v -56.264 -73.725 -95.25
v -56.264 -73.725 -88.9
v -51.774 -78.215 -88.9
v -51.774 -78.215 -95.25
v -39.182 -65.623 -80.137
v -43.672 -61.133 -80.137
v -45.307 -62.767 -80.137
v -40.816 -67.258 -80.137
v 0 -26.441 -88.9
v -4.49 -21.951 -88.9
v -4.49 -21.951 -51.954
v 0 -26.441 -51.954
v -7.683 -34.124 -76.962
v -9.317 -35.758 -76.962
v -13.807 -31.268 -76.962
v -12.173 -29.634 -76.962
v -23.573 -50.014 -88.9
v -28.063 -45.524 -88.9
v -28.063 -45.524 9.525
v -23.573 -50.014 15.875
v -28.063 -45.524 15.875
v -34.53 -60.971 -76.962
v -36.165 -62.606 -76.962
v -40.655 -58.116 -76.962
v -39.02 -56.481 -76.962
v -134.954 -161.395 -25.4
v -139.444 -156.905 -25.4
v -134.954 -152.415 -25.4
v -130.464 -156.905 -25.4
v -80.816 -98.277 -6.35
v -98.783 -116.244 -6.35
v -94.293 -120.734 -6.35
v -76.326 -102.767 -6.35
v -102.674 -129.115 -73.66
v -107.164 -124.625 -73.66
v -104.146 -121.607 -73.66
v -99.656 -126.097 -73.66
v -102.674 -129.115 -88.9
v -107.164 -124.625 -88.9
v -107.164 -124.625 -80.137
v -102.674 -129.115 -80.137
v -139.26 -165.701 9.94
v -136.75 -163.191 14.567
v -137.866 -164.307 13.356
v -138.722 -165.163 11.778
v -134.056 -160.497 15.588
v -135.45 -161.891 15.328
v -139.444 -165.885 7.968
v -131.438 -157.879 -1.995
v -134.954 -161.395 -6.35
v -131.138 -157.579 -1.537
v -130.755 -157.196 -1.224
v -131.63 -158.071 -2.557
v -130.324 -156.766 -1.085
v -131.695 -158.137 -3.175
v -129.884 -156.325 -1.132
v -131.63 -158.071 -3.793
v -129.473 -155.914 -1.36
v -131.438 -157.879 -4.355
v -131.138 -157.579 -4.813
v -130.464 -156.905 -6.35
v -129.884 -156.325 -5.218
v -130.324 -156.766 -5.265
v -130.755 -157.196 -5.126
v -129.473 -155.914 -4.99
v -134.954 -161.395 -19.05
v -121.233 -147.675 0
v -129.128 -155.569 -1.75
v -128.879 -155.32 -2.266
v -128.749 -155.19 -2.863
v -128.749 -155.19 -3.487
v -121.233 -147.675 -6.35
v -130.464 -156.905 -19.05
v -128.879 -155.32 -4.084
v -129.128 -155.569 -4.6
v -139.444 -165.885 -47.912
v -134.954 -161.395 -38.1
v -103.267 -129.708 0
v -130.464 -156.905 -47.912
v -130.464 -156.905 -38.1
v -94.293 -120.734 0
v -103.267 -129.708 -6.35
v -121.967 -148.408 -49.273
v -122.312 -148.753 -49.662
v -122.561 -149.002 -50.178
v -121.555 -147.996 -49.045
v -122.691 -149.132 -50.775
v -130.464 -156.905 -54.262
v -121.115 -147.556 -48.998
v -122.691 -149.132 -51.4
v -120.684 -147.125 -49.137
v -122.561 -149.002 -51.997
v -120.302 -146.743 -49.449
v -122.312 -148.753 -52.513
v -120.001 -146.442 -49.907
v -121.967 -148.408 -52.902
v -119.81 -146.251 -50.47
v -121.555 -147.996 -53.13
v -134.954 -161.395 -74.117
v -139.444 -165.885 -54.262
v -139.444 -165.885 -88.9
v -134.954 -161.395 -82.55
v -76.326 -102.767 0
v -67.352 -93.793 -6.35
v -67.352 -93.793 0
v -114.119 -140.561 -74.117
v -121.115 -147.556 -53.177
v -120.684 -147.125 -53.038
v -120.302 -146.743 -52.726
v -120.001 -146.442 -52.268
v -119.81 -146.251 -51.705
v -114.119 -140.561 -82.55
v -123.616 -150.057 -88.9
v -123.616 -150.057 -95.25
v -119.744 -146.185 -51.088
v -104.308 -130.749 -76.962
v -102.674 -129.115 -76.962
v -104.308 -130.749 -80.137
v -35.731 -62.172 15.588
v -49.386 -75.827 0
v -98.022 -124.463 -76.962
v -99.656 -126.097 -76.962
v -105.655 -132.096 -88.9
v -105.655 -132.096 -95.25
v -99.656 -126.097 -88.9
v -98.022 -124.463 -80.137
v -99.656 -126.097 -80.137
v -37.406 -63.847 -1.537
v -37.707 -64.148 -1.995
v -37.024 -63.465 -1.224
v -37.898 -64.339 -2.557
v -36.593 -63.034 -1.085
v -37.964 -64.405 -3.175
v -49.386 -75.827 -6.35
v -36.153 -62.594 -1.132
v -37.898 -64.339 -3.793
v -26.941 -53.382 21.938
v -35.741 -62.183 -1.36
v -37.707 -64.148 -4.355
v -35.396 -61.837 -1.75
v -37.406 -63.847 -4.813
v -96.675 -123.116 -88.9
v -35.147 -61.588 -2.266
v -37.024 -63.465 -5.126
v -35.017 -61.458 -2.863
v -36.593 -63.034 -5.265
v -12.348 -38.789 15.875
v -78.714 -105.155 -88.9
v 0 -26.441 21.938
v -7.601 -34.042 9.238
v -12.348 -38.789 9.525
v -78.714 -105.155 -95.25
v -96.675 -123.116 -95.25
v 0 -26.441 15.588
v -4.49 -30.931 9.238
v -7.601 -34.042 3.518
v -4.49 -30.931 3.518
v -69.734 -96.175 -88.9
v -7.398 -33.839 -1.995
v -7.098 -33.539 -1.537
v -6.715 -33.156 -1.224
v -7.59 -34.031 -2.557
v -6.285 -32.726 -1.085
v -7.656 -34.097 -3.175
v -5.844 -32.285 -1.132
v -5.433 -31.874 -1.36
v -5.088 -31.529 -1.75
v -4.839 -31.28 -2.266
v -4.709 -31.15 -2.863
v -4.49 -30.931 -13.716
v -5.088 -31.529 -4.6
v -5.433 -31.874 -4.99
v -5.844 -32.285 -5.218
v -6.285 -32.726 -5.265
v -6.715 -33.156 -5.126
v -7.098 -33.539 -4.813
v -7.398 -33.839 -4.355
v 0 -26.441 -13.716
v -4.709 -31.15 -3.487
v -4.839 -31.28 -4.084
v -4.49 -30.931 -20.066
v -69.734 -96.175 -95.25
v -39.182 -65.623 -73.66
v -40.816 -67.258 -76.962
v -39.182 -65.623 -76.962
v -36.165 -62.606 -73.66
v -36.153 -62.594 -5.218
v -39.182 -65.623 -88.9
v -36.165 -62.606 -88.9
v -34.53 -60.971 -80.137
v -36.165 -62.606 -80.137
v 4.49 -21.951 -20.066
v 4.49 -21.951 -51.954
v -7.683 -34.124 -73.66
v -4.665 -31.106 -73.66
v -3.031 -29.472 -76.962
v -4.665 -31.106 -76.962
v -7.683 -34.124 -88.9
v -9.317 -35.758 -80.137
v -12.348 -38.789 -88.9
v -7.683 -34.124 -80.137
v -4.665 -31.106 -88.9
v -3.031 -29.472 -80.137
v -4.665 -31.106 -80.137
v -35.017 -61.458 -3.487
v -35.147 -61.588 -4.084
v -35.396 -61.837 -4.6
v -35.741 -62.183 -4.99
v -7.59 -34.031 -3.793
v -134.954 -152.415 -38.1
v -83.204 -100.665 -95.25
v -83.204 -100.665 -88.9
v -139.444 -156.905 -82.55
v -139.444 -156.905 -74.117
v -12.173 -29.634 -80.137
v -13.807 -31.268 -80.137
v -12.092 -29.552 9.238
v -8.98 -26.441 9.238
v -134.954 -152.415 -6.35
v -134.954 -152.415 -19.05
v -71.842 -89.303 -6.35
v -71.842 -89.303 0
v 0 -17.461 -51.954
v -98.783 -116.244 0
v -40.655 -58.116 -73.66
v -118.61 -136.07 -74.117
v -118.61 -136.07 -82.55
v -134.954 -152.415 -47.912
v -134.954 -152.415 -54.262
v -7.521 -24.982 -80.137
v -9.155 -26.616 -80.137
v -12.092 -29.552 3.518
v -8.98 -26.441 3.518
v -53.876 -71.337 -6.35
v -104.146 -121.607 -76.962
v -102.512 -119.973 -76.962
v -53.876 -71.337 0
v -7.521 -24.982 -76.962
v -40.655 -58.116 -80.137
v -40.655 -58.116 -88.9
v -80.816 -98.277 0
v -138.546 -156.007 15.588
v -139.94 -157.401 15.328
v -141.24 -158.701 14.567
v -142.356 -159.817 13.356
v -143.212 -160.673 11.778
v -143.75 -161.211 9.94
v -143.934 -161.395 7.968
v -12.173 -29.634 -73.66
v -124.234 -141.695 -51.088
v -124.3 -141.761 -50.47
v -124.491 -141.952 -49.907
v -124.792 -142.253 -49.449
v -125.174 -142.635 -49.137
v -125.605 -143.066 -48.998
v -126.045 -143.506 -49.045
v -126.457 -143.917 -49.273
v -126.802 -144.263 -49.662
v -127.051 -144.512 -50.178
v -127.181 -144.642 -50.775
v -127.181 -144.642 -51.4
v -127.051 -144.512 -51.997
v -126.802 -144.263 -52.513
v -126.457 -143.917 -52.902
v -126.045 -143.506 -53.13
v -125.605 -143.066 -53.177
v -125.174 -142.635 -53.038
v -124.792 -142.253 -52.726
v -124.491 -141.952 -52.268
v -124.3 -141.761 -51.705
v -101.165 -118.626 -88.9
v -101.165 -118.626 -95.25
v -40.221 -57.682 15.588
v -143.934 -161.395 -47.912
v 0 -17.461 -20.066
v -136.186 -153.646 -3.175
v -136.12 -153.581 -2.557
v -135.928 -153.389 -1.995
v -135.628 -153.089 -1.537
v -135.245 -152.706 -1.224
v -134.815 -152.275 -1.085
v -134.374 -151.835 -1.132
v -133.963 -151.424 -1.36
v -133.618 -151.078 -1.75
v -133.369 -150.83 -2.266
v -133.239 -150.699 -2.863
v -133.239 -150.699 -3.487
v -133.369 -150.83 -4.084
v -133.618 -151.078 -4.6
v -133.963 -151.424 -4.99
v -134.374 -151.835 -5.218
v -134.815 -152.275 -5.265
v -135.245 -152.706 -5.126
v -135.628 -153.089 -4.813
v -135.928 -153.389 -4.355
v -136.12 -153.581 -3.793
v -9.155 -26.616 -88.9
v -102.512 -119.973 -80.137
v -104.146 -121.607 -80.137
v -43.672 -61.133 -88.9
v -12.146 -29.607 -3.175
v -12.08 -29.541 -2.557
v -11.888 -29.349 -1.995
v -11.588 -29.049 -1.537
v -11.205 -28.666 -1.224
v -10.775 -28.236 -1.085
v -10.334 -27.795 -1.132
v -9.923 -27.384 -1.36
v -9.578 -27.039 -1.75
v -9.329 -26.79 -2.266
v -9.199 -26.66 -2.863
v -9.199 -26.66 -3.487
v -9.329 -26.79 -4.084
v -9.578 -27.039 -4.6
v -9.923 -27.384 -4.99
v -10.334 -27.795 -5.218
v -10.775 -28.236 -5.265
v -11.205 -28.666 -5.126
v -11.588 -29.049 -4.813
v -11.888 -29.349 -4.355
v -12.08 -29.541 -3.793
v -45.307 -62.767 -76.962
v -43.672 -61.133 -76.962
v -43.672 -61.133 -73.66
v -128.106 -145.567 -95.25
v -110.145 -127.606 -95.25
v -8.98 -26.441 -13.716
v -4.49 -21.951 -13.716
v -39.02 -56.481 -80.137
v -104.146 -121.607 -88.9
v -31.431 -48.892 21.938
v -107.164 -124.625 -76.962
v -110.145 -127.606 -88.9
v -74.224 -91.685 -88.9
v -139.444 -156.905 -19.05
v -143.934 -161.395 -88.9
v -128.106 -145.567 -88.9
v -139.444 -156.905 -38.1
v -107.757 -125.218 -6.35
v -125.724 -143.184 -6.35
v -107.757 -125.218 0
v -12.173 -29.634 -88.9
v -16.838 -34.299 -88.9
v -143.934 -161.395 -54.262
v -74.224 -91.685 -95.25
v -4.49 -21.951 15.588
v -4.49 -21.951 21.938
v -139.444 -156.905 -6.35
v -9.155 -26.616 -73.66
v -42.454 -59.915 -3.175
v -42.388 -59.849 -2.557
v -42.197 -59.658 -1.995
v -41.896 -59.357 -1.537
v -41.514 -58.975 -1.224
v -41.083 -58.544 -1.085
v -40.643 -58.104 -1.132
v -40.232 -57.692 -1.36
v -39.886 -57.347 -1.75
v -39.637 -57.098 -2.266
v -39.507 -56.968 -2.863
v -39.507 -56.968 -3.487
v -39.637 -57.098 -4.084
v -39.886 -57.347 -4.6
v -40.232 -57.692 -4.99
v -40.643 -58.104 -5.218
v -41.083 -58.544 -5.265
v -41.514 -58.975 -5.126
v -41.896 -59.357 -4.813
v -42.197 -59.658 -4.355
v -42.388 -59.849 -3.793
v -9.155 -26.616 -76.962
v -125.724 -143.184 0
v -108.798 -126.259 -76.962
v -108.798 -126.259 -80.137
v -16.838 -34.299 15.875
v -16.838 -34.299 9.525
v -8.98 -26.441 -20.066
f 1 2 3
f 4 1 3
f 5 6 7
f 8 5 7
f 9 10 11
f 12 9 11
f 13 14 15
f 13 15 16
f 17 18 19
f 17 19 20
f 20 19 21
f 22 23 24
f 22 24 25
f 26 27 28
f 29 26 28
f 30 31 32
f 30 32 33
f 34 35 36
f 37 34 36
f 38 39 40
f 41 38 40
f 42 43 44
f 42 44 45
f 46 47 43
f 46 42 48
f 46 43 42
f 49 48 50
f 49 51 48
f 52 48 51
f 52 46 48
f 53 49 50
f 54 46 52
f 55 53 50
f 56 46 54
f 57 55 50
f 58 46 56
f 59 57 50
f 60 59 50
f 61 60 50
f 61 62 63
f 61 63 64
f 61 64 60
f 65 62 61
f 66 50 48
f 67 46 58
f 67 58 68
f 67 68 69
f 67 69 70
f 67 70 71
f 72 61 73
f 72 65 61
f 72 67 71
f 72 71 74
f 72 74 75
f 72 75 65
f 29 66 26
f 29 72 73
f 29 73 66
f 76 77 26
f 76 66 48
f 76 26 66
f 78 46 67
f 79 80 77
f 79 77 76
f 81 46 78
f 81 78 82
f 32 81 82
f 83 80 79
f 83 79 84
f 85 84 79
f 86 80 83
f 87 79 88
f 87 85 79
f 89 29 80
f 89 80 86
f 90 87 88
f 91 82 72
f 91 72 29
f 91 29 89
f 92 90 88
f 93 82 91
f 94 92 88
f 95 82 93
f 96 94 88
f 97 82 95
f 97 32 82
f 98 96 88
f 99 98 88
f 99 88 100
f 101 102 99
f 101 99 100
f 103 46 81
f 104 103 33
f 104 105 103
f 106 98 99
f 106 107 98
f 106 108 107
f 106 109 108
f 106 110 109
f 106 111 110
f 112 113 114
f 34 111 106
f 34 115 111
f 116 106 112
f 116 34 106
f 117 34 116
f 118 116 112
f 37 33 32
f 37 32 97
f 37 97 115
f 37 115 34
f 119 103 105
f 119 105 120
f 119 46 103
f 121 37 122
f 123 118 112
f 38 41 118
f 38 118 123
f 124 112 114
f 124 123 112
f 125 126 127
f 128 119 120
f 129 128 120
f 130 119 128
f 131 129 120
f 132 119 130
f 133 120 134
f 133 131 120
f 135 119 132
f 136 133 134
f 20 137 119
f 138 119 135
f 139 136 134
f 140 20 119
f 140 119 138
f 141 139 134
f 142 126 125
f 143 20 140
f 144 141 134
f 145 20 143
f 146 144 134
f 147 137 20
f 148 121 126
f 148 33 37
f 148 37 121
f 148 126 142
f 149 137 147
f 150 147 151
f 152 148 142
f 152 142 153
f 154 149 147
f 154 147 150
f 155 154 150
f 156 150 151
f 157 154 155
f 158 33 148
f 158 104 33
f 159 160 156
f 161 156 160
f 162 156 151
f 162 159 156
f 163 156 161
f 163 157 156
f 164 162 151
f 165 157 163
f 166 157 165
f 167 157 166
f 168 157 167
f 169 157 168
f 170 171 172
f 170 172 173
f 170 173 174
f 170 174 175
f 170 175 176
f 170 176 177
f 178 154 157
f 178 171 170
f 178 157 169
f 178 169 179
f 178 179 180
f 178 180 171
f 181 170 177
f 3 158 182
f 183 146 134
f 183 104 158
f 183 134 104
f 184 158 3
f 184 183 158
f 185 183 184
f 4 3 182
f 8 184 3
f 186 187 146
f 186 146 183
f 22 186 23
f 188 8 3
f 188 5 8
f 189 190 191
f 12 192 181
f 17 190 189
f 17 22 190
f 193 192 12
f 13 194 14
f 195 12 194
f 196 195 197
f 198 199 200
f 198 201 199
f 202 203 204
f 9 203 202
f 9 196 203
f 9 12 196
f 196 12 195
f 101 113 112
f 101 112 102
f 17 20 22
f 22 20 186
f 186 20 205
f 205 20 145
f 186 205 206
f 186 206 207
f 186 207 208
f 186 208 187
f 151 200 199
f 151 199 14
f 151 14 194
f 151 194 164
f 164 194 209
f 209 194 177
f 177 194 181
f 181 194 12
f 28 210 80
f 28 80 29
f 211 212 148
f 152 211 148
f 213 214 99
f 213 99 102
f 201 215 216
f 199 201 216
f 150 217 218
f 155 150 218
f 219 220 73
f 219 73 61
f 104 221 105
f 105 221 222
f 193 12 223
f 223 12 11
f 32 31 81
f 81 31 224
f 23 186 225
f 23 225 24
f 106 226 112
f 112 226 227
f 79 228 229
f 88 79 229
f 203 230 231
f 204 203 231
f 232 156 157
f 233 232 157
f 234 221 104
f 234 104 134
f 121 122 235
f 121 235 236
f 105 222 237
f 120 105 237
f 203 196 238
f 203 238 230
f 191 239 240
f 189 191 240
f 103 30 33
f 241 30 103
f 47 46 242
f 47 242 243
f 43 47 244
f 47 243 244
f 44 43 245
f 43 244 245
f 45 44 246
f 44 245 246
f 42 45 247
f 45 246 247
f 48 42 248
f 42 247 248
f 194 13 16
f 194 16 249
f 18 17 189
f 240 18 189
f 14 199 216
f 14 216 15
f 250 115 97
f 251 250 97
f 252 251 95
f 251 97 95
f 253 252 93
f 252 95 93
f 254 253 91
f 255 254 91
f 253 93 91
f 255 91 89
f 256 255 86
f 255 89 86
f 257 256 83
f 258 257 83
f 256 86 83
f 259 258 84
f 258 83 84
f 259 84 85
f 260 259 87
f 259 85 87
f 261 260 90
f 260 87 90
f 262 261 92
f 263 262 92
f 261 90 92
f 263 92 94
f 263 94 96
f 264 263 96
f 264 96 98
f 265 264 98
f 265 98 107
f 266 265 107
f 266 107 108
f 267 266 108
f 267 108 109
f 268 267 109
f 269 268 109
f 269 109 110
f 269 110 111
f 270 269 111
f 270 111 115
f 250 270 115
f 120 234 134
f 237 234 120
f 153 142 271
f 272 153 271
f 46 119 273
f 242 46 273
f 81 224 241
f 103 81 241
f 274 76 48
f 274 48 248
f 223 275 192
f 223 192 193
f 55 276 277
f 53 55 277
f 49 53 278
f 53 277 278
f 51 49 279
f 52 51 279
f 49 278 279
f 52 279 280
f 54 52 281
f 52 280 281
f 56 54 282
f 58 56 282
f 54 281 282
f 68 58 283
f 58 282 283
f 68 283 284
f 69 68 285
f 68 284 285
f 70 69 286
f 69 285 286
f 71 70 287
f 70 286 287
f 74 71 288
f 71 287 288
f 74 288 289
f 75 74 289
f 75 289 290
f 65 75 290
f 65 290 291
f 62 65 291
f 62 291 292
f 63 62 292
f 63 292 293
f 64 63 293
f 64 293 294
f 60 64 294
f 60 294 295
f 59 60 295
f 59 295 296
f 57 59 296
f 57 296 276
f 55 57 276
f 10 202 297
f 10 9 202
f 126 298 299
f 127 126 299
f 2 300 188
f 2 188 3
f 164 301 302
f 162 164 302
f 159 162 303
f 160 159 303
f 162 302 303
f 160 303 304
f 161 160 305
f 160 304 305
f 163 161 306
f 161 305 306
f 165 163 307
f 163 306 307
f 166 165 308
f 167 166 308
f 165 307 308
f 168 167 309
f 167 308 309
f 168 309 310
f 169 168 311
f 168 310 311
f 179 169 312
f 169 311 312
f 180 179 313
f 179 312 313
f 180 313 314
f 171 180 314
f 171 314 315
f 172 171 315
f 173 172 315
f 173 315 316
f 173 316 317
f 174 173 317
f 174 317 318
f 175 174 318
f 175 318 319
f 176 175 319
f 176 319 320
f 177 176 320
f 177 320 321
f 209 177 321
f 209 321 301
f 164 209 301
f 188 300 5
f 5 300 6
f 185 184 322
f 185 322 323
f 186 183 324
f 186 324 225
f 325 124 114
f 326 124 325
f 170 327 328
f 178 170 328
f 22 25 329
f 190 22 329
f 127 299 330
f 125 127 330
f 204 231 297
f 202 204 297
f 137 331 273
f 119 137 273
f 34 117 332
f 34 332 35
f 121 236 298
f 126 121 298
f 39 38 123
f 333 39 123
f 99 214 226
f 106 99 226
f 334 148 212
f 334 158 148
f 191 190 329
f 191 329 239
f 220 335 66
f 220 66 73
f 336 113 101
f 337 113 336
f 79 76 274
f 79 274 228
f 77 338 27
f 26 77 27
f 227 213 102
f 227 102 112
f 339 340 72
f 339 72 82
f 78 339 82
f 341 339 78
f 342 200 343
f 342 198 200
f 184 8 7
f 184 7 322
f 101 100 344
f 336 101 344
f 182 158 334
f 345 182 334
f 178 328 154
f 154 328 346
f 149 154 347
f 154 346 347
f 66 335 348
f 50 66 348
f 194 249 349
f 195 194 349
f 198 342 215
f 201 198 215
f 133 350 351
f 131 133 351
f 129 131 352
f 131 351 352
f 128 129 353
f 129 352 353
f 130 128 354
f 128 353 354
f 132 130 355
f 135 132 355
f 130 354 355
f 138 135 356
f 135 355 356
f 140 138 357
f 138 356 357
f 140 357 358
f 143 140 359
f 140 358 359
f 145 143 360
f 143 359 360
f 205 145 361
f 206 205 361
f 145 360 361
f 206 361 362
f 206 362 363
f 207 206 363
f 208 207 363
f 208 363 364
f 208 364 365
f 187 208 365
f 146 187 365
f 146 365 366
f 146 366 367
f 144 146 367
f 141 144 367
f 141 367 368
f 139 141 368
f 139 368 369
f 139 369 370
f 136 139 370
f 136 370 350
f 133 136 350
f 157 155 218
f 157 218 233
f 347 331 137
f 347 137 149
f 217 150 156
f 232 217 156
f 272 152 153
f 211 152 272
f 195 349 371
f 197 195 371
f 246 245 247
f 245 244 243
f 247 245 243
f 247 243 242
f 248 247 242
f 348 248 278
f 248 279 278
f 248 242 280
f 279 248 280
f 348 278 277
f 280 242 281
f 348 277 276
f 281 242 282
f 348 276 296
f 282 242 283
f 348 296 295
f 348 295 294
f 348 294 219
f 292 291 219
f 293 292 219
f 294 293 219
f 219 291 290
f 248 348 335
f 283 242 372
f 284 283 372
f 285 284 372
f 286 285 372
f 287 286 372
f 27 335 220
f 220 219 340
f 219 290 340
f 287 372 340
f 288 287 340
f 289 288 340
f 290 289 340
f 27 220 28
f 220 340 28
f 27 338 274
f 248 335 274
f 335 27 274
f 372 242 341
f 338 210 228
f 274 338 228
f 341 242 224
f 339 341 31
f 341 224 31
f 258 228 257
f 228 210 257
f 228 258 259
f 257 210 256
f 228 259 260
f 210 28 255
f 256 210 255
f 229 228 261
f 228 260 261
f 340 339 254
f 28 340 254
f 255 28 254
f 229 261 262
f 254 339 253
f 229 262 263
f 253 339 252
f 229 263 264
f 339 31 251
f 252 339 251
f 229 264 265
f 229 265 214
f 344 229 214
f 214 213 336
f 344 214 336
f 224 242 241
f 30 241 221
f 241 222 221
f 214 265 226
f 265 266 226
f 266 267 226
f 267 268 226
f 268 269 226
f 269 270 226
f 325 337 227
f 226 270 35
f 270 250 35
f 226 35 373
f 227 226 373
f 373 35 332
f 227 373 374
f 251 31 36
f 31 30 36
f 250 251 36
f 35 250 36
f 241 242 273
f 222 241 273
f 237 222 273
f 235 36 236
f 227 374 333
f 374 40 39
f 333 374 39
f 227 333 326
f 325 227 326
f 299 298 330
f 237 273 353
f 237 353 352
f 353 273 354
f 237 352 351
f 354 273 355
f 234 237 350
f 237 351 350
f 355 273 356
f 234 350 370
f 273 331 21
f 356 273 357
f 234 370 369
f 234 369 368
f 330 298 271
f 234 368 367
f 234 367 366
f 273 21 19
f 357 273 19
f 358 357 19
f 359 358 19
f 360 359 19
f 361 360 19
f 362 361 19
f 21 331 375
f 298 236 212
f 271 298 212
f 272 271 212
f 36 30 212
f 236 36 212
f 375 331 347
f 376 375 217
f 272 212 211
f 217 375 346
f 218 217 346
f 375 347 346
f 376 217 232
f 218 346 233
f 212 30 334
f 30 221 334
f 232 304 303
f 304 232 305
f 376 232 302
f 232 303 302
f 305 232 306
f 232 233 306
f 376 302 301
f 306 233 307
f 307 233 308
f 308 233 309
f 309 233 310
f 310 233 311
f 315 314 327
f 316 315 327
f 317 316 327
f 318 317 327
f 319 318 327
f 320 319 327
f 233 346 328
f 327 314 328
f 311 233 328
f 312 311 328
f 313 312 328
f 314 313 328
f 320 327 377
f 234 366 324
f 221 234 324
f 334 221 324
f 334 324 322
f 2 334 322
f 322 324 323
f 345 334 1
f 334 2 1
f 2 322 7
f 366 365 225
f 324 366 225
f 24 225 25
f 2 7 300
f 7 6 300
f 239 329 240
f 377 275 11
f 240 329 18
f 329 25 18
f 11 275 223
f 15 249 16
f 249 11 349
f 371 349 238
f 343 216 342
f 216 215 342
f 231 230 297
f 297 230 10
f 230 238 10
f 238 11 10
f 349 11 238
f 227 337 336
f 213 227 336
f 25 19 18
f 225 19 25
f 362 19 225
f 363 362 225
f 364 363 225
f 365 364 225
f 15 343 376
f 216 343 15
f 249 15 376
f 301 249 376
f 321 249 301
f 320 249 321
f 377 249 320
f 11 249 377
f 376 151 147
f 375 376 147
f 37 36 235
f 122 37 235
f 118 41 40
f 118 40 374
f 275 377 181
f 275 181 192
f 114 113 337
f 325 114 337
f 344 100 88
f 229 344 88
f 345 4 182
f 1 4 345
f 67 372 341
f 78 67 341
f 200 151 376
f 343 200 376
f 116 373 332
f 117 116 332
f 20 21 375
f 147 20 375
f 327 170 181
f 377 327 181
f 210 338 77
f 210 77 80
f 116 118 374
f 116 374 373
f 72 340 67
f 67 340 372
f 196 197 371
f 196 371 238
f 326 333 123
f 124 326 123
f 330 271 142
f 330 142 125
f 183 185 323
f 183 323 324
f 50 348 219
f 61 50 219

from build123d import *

# Parameters (mm, degrees)
BASE_EXTRUSION_DEPTH                 = 15.5875
BASE_EXTRUSION_DEPTH_BACK            = 88.9
PICKER_CLEARANCE_DEPTH               = 98.425
SKETCH3_W                            = 6.35
SKETCH3_H                            = 12.7
CLOTHES_LINE_NOTCH_DEPTH             = 237.446920576
TAB_TO_TOP_PLATE_DEPTH               = 6.35
TOP_PLATE_TABS_COUNT                 = 3
TOP_PLATE_TABS_PITCH                 = 38.1
SKETCH5_W                            = 6.35
SKETCH5_H                            = 25.408256086
BASE_PLATE_TAB_DEPTH                 = 6.35
BASE_PLATE_TAB_HOLES_COUNT           = 3
BASE_PLATE_TAB_HOLES_PITCH           = 38.1
SKETCH8_W                            = 12.7
SKETCH8_H                            = 6.35
BREAK_BEAM_DEPTH                     = 6.35
BREAK_BEAM_HOLES_COUNT               = 2
BREAK_BEAM_HOLES_PITCH               = 19.05
SKETCH10_R                           = 2.0955
CLOTHES_LINE_HOLE_DEPTH              = 239.906883011
CHASSIS_TOP_PLATE_T_SLOT_HOTES_DEPTH = 239.906883011
SKETCH12_R                           = 2.0955
CHASSIS_BASE_PLATE_HOLES_DEPTH       = 239.906883011
V_FUNNEL_CORNER_FILLET_R             = 7.62
BOSS_EXTRUDE1_DEPTH                  = 6.35
SKETCH14_W                           = 6.35
SKETCH14_H                           = 15.875
CUT_EXTRUDE1_DEPTH                   = 239.906883011
SKETCH16_W                           = 36.945833334
SKETCH16_H                           = 6.35
BOSS_EXTRUDE2_DEPTH                  = 6.35
SKETCH18_W                           = 29.464
SKETCH18_H                           = 8.4328
CUT_EXTRUDE2_DEPTH                   = 239.906883011
SKETCH19_W                           = 12.7
SKETCH19_H                           = 6.35
CUT_EXTRUDE3_DEPTH                   = 239.906883011
SKETCH22_W                           = 5.72
SKETCH22_H                           = 4.4
CUT_EXTRUDE6_DEPTH                   = 239.906883011


with BuildPart() as part:
    # Sketch1 → Base Extrusion (new, two sides: drawn at the far end of the back side and taken through both)
    with BuildSketch(Plane.XY.offset(-BASE_EXTRUSION_DEPTH_BACK)):
        Polygon((-4.490128061, -21.950964887), (0, -26.441092948), (-139.443807584, -165.884900532), (-143.933935645, -161.394772471), align=None)
    extrude(amount=BASE_EXTRUSION_DEPTH + BASE_EXTRUSION_DEPTH_BACK)

    # Sketch2 → Picker Clearance (cut)
    with BuildSketch(Plane(origin=(0, 0, -88.9), x_dir=(-1, 0, 0), z_dir=(0, 0, -1))):
        Polygon((12.347852166, -38.788945114), (16.837980227, -34.298817054), (28.063300378, -45.524137205), (23.573172318, -50.014265265), align=None)
    extrude(amount=-PICKER_CLEARANCE_DEPTH, mode=Mode.SUBTRACT)

    # Sketch3 → Clothes Line Notch (cut, through all)
    with BuildSketch(Plane(origin=(13.220546474, -13.220546474, 0), x_dir=(0, 0, -1), z_dir=(0.7071067811865477, -0.7071067811865474, 0))):
        with Locations((51.0875, -209.55)):
            Rectangle(SKETCH3_W, SKETCH3_H)
    extrude(amount=-CLOTHES_LINE_NOTCH_DEPTH, mode=Mode.SUBTRACT)

    # Sketch4 → Tab to Top Plate (add)
    with BuildSketch(Plane(origin=(0, 0, -88.9), x_dir=(-1, 0, 0), z_dir=(0, 0, -1))):
        Polygon((123.615619379, -150.056712327), (128.10574744, -145.566584266), (110.145235198, -127.606072024), (105.655107137, -132.096200085), align=None)
    tab_to_top_plate = extrude(amount=TAB_TO_TOP_PLATE_DEPTH)

    # Top Plate Tabs: Tab to Top Plate ×3
    with Locations(*[Vector(0.7071067811865476, 0.7071067811865476, 0) * (i * TOP_PLATE_TABS_PITCH) for i in range(1, TOP_PLATE_TABS_COUNT)]):
        add(tab_to_top_plate)

    # Sketch5 → Base Plate Tab (cut)
    with BuildSketch(Plane(origin=(8.730418413, -8.730418413, 0), x_dir=(0, 0, 1), z_dir=(-0.7071067811865477, 0.7071067811865475, 0))):
        with Locations((-3.175, -177.442548082)):
            Rectangle(SKETCH5_W, SKETCH5_H)
    base_plate_tab = extrude(amount=-BASE_PLATE_TAB_DEPTH, mode=Mode.SUBTRACT)

    # Base Plate Tab holes: Base Plate Tab ×3
    with Locations(*[Vector(0.7071067811865474, 0.7071067811865477, 0) * (i * BASE_PLATE_TAB_HOLES_PITCH) for i in range(1, BASE_PLATE_TAB_HOLES_COUNT)]):
        add(base_plate_tab, mode=Mode.SUBTRACT)

    # Sketch8 → Break Beam (cut)
    with BuildSketch(Plane(origin=(8.730418413, -8.730418413, 0), x_dir=(0, 0, 1), z_dir=(-0.7071067811865477, 0.7071067811865475, 0))):
        with Locations((-12.7, -206.375)):
            Rectangle(SKETCH8_W, SKETCH8_H)
    break_beam = extrude(amount=-BREAK_BEAM_DEPTH, mode=Mode.SUBTRACT)

    # Break Beam Holes: Break Beam ×2
    with Locations(*[(0, 0, -i * BREAK_BEAM_HOLES_PITCH) for i in range(1, BREAK_BEAM_HOLES_COUNT)]):
        add(break_beam, mode=Mode.SUBTRACT)

    # Sketch10 → Clothes Line Hole (cut, through all)
    with BuildSketch(Plane(origin=(13.220546474, -13.220546474, 0), x_dir=(0, 0, -1), z_dir=(0.7071067811865477, -0.7071067811865474, 0))):
        with Locations(Location((51.0875, -190.135614919, 0), (0, 0, 90))):
            Circle(SKETCH10_R)
    extrude(amount=-CLOTHES_LINE_HOLE_DEPTH, mode=Mode.SUBTRACT)

    # Sketch11 → Chassis top Plate T Slot Hotes (cut, through all)
    with BuildSketch(Plane(origin=(8.730418413, -8.730418413, 0), x_dir=(0.7071067811865475, 0.7071067811865477, 0), z_dir=(-0.7071067811865477, 0.7071067811865475, 0))):
        Polygon((-159.631961573, 88.9), (-163.899161573, 88.9), (-163.899161573, 80.137), (-166.210561573, 80.137), (-166.210561573, 76.962), (-163.899161573, 76.962), (-163.899161573, 73.66), (-159.631961573, 73.66), (-159.631961573, 76.962), (-157.320561573, 76.962), (-157.320561573, 80.137), (-159.631961573, 80.137), align=None)
        Polygon((-69.841268849, 88.9), (-74.108468849, 88.9), (-74.108468849, 80.137), (-76.419868849, 80.137), (-76.419868849, 76.962), (-74.108468849, 76.962), (-74.108468849, 73.66), (-69.841268849, 73.66), (-69.841268849, 76.962), (-67.529868849, 76.962), (-67.529868849, 80.137), (-69.841268849, 80.137), align=None)
        Polygon((-25.294326125, 88.9), (-29.561526125, 88.9), (-29.561526125, 80.137), (-31.872926125, 80.137), (-31.872926125, 76.962), (-29.561526125, 76.962), (-29.561526125, 73.66), (-25.294326125, 73.66), (-25.294326125, 76.962), (-22.982926125, 76.962), (-22.982926125, 80.137), (-25.294326125, 80.137), align=None)
    extrude(amount=-CHASSIS_TOP_PLATE_T_SLOT_HOTES_DEPTH, mode=Mode.SUBTRACT)

    # Sketch12 → Chassis Base Plate Holes (cut, through all)
    with BuildSketch(Plane(origin=(8.730418413, -8.730418413, 0), x_dir=(0.7071067811865475, 0.7071067811865477, 0), z_dir=(-0.7071067811865477, 0.7071067811865475, 0))):
        with Locations(Location((-202.846676125, 3.175, 0), (0, 0, 180))):
            Circle(SKETCH12_R)
        with Locations(Location((-70.290426125, 3.175, 0), (0, 0, 180))):
            Circle(SKETCH12_R)
        with Locations(Location((-27.427926125, 3.175, 0), (0, 0, 180))):
            Circle(SKETCH12_R)
    extrude(amount=-CHASSIS_BASE_PLATE_HOLES_DEPTH, mode=Mode.SUBTRACT)

    # V Funnel Corner Fillet
    v_funnel_corner_fillet_edges = [part.edges().sort_by_distance(p)[0] for p in [
        (-141.688871615, -163.639836502, 15.5875),
    ]]
    fillet(v_funnel_corner_fillet_edges, radius=V_FUNNEL_CORNER_FILLET_R)

    # Sketch13 → Boss-Extrude1 (add)
    with BuildSketch(Plane(origin=(8.730418413, -8.730418413, 0), x_dir=(0, 0, 1), z_dir=(-0.7071067811865477, 0.7071067811865475, 0))):
        Polygon((15.5875, -56.796676125), (15.5875, -31.396676125), (15.5875, -18.696676125), (21.9375, -18.696676125), (21.9375, -31.396676125), (21.9375, -56.796676125), (15.5875, -69.227964479), align=None)
    extrude(amount=-BOSS_EXTRUDE1_DEPTH)

    # Sketch14 → Cut-Extrude1 (cut, through all)
    with BuildSketch(Plane(origin=(8.730418413, -8.730418413, 0), x_dir=(0, 0, 1), z_dir=(-0.7071067811865477, 0.7071067811865475, 0))):
        with Locations((12.7, -44.096676125)):
            Rectangle(SKETCH14_W, SKETCH14_H)
    extrude(amount=-CUT_EXTRUDE1_DEPTH, mode=Mode.SUBTRACT)

    # Sketch16 → Boss-Extrude2 (add)
    with BuildSketch(Plane(origin=(-13.220546474, -13.220546474, 0), x_dir=(0, 0, -1), z_dir=(0.7071067811865519, 0.7071067811865431, 0))):
        with Locations((33.48125, -15.521676125)):
            Rectangle(SKETCH16_W, SKETCH16_H)
    extrude(amount=BOSS_EXTRUDE2_DEPTH)

    # Sketch18 → Cut-Extrude2 (cut, through all)
    with BuildSketch(Plane(origin=(8.730418413, -8.730418413, 0), x_dir=(0.7071067811865475, 0.7071067811865477, 0), z_dir=(-0.7071067811865477, 0.7071067811865475, 0))):
        with Locations((-194.818, 78.3336)):
            Rectangle(SKETCH18_W, SKETCH18_H)
    extrude(amount=-CUT_EXTRUDE2_DEPTH, mode=Mode.SUBTRACT)

    # Sketch19 → Cut-Extrude3 (cut, through all)
    with BuildSketch(Plane(origin=(8.730418413, -8.730418413, 0), x_dir=(0.7071067811865475, 0.7071067811865477, 0), z_dir=(-0.7071067811865477, 0.7071067811865475, 0))):
        with Locations((-18.696676125, 16.891)):
            Rectangle(SKETCH19_W, SKETCH19_H)
    extrude(amount=-CUT_EXTRUDE3_DEPTH, mode=Mode.SUBTRACT)

    # Sketch22 → Cut-Extrude6 (cut, through all)
    with BuildSketch(Plane(origin=(13.220546474, -13.220546474, 0), x_dir=(0, 0, -1), z_dir=(0.7071067811865475, -0.7071067811865476, 0))):
        with Locations((-6.3775, -27.246676125)):
            Rectangle(SKETCH22_W, SKETCH22_H)
    extrude(amount=-CUT_EXTRUDE6_DEPTH, mode=Mode.SUBTRACT)


solid = part.part
